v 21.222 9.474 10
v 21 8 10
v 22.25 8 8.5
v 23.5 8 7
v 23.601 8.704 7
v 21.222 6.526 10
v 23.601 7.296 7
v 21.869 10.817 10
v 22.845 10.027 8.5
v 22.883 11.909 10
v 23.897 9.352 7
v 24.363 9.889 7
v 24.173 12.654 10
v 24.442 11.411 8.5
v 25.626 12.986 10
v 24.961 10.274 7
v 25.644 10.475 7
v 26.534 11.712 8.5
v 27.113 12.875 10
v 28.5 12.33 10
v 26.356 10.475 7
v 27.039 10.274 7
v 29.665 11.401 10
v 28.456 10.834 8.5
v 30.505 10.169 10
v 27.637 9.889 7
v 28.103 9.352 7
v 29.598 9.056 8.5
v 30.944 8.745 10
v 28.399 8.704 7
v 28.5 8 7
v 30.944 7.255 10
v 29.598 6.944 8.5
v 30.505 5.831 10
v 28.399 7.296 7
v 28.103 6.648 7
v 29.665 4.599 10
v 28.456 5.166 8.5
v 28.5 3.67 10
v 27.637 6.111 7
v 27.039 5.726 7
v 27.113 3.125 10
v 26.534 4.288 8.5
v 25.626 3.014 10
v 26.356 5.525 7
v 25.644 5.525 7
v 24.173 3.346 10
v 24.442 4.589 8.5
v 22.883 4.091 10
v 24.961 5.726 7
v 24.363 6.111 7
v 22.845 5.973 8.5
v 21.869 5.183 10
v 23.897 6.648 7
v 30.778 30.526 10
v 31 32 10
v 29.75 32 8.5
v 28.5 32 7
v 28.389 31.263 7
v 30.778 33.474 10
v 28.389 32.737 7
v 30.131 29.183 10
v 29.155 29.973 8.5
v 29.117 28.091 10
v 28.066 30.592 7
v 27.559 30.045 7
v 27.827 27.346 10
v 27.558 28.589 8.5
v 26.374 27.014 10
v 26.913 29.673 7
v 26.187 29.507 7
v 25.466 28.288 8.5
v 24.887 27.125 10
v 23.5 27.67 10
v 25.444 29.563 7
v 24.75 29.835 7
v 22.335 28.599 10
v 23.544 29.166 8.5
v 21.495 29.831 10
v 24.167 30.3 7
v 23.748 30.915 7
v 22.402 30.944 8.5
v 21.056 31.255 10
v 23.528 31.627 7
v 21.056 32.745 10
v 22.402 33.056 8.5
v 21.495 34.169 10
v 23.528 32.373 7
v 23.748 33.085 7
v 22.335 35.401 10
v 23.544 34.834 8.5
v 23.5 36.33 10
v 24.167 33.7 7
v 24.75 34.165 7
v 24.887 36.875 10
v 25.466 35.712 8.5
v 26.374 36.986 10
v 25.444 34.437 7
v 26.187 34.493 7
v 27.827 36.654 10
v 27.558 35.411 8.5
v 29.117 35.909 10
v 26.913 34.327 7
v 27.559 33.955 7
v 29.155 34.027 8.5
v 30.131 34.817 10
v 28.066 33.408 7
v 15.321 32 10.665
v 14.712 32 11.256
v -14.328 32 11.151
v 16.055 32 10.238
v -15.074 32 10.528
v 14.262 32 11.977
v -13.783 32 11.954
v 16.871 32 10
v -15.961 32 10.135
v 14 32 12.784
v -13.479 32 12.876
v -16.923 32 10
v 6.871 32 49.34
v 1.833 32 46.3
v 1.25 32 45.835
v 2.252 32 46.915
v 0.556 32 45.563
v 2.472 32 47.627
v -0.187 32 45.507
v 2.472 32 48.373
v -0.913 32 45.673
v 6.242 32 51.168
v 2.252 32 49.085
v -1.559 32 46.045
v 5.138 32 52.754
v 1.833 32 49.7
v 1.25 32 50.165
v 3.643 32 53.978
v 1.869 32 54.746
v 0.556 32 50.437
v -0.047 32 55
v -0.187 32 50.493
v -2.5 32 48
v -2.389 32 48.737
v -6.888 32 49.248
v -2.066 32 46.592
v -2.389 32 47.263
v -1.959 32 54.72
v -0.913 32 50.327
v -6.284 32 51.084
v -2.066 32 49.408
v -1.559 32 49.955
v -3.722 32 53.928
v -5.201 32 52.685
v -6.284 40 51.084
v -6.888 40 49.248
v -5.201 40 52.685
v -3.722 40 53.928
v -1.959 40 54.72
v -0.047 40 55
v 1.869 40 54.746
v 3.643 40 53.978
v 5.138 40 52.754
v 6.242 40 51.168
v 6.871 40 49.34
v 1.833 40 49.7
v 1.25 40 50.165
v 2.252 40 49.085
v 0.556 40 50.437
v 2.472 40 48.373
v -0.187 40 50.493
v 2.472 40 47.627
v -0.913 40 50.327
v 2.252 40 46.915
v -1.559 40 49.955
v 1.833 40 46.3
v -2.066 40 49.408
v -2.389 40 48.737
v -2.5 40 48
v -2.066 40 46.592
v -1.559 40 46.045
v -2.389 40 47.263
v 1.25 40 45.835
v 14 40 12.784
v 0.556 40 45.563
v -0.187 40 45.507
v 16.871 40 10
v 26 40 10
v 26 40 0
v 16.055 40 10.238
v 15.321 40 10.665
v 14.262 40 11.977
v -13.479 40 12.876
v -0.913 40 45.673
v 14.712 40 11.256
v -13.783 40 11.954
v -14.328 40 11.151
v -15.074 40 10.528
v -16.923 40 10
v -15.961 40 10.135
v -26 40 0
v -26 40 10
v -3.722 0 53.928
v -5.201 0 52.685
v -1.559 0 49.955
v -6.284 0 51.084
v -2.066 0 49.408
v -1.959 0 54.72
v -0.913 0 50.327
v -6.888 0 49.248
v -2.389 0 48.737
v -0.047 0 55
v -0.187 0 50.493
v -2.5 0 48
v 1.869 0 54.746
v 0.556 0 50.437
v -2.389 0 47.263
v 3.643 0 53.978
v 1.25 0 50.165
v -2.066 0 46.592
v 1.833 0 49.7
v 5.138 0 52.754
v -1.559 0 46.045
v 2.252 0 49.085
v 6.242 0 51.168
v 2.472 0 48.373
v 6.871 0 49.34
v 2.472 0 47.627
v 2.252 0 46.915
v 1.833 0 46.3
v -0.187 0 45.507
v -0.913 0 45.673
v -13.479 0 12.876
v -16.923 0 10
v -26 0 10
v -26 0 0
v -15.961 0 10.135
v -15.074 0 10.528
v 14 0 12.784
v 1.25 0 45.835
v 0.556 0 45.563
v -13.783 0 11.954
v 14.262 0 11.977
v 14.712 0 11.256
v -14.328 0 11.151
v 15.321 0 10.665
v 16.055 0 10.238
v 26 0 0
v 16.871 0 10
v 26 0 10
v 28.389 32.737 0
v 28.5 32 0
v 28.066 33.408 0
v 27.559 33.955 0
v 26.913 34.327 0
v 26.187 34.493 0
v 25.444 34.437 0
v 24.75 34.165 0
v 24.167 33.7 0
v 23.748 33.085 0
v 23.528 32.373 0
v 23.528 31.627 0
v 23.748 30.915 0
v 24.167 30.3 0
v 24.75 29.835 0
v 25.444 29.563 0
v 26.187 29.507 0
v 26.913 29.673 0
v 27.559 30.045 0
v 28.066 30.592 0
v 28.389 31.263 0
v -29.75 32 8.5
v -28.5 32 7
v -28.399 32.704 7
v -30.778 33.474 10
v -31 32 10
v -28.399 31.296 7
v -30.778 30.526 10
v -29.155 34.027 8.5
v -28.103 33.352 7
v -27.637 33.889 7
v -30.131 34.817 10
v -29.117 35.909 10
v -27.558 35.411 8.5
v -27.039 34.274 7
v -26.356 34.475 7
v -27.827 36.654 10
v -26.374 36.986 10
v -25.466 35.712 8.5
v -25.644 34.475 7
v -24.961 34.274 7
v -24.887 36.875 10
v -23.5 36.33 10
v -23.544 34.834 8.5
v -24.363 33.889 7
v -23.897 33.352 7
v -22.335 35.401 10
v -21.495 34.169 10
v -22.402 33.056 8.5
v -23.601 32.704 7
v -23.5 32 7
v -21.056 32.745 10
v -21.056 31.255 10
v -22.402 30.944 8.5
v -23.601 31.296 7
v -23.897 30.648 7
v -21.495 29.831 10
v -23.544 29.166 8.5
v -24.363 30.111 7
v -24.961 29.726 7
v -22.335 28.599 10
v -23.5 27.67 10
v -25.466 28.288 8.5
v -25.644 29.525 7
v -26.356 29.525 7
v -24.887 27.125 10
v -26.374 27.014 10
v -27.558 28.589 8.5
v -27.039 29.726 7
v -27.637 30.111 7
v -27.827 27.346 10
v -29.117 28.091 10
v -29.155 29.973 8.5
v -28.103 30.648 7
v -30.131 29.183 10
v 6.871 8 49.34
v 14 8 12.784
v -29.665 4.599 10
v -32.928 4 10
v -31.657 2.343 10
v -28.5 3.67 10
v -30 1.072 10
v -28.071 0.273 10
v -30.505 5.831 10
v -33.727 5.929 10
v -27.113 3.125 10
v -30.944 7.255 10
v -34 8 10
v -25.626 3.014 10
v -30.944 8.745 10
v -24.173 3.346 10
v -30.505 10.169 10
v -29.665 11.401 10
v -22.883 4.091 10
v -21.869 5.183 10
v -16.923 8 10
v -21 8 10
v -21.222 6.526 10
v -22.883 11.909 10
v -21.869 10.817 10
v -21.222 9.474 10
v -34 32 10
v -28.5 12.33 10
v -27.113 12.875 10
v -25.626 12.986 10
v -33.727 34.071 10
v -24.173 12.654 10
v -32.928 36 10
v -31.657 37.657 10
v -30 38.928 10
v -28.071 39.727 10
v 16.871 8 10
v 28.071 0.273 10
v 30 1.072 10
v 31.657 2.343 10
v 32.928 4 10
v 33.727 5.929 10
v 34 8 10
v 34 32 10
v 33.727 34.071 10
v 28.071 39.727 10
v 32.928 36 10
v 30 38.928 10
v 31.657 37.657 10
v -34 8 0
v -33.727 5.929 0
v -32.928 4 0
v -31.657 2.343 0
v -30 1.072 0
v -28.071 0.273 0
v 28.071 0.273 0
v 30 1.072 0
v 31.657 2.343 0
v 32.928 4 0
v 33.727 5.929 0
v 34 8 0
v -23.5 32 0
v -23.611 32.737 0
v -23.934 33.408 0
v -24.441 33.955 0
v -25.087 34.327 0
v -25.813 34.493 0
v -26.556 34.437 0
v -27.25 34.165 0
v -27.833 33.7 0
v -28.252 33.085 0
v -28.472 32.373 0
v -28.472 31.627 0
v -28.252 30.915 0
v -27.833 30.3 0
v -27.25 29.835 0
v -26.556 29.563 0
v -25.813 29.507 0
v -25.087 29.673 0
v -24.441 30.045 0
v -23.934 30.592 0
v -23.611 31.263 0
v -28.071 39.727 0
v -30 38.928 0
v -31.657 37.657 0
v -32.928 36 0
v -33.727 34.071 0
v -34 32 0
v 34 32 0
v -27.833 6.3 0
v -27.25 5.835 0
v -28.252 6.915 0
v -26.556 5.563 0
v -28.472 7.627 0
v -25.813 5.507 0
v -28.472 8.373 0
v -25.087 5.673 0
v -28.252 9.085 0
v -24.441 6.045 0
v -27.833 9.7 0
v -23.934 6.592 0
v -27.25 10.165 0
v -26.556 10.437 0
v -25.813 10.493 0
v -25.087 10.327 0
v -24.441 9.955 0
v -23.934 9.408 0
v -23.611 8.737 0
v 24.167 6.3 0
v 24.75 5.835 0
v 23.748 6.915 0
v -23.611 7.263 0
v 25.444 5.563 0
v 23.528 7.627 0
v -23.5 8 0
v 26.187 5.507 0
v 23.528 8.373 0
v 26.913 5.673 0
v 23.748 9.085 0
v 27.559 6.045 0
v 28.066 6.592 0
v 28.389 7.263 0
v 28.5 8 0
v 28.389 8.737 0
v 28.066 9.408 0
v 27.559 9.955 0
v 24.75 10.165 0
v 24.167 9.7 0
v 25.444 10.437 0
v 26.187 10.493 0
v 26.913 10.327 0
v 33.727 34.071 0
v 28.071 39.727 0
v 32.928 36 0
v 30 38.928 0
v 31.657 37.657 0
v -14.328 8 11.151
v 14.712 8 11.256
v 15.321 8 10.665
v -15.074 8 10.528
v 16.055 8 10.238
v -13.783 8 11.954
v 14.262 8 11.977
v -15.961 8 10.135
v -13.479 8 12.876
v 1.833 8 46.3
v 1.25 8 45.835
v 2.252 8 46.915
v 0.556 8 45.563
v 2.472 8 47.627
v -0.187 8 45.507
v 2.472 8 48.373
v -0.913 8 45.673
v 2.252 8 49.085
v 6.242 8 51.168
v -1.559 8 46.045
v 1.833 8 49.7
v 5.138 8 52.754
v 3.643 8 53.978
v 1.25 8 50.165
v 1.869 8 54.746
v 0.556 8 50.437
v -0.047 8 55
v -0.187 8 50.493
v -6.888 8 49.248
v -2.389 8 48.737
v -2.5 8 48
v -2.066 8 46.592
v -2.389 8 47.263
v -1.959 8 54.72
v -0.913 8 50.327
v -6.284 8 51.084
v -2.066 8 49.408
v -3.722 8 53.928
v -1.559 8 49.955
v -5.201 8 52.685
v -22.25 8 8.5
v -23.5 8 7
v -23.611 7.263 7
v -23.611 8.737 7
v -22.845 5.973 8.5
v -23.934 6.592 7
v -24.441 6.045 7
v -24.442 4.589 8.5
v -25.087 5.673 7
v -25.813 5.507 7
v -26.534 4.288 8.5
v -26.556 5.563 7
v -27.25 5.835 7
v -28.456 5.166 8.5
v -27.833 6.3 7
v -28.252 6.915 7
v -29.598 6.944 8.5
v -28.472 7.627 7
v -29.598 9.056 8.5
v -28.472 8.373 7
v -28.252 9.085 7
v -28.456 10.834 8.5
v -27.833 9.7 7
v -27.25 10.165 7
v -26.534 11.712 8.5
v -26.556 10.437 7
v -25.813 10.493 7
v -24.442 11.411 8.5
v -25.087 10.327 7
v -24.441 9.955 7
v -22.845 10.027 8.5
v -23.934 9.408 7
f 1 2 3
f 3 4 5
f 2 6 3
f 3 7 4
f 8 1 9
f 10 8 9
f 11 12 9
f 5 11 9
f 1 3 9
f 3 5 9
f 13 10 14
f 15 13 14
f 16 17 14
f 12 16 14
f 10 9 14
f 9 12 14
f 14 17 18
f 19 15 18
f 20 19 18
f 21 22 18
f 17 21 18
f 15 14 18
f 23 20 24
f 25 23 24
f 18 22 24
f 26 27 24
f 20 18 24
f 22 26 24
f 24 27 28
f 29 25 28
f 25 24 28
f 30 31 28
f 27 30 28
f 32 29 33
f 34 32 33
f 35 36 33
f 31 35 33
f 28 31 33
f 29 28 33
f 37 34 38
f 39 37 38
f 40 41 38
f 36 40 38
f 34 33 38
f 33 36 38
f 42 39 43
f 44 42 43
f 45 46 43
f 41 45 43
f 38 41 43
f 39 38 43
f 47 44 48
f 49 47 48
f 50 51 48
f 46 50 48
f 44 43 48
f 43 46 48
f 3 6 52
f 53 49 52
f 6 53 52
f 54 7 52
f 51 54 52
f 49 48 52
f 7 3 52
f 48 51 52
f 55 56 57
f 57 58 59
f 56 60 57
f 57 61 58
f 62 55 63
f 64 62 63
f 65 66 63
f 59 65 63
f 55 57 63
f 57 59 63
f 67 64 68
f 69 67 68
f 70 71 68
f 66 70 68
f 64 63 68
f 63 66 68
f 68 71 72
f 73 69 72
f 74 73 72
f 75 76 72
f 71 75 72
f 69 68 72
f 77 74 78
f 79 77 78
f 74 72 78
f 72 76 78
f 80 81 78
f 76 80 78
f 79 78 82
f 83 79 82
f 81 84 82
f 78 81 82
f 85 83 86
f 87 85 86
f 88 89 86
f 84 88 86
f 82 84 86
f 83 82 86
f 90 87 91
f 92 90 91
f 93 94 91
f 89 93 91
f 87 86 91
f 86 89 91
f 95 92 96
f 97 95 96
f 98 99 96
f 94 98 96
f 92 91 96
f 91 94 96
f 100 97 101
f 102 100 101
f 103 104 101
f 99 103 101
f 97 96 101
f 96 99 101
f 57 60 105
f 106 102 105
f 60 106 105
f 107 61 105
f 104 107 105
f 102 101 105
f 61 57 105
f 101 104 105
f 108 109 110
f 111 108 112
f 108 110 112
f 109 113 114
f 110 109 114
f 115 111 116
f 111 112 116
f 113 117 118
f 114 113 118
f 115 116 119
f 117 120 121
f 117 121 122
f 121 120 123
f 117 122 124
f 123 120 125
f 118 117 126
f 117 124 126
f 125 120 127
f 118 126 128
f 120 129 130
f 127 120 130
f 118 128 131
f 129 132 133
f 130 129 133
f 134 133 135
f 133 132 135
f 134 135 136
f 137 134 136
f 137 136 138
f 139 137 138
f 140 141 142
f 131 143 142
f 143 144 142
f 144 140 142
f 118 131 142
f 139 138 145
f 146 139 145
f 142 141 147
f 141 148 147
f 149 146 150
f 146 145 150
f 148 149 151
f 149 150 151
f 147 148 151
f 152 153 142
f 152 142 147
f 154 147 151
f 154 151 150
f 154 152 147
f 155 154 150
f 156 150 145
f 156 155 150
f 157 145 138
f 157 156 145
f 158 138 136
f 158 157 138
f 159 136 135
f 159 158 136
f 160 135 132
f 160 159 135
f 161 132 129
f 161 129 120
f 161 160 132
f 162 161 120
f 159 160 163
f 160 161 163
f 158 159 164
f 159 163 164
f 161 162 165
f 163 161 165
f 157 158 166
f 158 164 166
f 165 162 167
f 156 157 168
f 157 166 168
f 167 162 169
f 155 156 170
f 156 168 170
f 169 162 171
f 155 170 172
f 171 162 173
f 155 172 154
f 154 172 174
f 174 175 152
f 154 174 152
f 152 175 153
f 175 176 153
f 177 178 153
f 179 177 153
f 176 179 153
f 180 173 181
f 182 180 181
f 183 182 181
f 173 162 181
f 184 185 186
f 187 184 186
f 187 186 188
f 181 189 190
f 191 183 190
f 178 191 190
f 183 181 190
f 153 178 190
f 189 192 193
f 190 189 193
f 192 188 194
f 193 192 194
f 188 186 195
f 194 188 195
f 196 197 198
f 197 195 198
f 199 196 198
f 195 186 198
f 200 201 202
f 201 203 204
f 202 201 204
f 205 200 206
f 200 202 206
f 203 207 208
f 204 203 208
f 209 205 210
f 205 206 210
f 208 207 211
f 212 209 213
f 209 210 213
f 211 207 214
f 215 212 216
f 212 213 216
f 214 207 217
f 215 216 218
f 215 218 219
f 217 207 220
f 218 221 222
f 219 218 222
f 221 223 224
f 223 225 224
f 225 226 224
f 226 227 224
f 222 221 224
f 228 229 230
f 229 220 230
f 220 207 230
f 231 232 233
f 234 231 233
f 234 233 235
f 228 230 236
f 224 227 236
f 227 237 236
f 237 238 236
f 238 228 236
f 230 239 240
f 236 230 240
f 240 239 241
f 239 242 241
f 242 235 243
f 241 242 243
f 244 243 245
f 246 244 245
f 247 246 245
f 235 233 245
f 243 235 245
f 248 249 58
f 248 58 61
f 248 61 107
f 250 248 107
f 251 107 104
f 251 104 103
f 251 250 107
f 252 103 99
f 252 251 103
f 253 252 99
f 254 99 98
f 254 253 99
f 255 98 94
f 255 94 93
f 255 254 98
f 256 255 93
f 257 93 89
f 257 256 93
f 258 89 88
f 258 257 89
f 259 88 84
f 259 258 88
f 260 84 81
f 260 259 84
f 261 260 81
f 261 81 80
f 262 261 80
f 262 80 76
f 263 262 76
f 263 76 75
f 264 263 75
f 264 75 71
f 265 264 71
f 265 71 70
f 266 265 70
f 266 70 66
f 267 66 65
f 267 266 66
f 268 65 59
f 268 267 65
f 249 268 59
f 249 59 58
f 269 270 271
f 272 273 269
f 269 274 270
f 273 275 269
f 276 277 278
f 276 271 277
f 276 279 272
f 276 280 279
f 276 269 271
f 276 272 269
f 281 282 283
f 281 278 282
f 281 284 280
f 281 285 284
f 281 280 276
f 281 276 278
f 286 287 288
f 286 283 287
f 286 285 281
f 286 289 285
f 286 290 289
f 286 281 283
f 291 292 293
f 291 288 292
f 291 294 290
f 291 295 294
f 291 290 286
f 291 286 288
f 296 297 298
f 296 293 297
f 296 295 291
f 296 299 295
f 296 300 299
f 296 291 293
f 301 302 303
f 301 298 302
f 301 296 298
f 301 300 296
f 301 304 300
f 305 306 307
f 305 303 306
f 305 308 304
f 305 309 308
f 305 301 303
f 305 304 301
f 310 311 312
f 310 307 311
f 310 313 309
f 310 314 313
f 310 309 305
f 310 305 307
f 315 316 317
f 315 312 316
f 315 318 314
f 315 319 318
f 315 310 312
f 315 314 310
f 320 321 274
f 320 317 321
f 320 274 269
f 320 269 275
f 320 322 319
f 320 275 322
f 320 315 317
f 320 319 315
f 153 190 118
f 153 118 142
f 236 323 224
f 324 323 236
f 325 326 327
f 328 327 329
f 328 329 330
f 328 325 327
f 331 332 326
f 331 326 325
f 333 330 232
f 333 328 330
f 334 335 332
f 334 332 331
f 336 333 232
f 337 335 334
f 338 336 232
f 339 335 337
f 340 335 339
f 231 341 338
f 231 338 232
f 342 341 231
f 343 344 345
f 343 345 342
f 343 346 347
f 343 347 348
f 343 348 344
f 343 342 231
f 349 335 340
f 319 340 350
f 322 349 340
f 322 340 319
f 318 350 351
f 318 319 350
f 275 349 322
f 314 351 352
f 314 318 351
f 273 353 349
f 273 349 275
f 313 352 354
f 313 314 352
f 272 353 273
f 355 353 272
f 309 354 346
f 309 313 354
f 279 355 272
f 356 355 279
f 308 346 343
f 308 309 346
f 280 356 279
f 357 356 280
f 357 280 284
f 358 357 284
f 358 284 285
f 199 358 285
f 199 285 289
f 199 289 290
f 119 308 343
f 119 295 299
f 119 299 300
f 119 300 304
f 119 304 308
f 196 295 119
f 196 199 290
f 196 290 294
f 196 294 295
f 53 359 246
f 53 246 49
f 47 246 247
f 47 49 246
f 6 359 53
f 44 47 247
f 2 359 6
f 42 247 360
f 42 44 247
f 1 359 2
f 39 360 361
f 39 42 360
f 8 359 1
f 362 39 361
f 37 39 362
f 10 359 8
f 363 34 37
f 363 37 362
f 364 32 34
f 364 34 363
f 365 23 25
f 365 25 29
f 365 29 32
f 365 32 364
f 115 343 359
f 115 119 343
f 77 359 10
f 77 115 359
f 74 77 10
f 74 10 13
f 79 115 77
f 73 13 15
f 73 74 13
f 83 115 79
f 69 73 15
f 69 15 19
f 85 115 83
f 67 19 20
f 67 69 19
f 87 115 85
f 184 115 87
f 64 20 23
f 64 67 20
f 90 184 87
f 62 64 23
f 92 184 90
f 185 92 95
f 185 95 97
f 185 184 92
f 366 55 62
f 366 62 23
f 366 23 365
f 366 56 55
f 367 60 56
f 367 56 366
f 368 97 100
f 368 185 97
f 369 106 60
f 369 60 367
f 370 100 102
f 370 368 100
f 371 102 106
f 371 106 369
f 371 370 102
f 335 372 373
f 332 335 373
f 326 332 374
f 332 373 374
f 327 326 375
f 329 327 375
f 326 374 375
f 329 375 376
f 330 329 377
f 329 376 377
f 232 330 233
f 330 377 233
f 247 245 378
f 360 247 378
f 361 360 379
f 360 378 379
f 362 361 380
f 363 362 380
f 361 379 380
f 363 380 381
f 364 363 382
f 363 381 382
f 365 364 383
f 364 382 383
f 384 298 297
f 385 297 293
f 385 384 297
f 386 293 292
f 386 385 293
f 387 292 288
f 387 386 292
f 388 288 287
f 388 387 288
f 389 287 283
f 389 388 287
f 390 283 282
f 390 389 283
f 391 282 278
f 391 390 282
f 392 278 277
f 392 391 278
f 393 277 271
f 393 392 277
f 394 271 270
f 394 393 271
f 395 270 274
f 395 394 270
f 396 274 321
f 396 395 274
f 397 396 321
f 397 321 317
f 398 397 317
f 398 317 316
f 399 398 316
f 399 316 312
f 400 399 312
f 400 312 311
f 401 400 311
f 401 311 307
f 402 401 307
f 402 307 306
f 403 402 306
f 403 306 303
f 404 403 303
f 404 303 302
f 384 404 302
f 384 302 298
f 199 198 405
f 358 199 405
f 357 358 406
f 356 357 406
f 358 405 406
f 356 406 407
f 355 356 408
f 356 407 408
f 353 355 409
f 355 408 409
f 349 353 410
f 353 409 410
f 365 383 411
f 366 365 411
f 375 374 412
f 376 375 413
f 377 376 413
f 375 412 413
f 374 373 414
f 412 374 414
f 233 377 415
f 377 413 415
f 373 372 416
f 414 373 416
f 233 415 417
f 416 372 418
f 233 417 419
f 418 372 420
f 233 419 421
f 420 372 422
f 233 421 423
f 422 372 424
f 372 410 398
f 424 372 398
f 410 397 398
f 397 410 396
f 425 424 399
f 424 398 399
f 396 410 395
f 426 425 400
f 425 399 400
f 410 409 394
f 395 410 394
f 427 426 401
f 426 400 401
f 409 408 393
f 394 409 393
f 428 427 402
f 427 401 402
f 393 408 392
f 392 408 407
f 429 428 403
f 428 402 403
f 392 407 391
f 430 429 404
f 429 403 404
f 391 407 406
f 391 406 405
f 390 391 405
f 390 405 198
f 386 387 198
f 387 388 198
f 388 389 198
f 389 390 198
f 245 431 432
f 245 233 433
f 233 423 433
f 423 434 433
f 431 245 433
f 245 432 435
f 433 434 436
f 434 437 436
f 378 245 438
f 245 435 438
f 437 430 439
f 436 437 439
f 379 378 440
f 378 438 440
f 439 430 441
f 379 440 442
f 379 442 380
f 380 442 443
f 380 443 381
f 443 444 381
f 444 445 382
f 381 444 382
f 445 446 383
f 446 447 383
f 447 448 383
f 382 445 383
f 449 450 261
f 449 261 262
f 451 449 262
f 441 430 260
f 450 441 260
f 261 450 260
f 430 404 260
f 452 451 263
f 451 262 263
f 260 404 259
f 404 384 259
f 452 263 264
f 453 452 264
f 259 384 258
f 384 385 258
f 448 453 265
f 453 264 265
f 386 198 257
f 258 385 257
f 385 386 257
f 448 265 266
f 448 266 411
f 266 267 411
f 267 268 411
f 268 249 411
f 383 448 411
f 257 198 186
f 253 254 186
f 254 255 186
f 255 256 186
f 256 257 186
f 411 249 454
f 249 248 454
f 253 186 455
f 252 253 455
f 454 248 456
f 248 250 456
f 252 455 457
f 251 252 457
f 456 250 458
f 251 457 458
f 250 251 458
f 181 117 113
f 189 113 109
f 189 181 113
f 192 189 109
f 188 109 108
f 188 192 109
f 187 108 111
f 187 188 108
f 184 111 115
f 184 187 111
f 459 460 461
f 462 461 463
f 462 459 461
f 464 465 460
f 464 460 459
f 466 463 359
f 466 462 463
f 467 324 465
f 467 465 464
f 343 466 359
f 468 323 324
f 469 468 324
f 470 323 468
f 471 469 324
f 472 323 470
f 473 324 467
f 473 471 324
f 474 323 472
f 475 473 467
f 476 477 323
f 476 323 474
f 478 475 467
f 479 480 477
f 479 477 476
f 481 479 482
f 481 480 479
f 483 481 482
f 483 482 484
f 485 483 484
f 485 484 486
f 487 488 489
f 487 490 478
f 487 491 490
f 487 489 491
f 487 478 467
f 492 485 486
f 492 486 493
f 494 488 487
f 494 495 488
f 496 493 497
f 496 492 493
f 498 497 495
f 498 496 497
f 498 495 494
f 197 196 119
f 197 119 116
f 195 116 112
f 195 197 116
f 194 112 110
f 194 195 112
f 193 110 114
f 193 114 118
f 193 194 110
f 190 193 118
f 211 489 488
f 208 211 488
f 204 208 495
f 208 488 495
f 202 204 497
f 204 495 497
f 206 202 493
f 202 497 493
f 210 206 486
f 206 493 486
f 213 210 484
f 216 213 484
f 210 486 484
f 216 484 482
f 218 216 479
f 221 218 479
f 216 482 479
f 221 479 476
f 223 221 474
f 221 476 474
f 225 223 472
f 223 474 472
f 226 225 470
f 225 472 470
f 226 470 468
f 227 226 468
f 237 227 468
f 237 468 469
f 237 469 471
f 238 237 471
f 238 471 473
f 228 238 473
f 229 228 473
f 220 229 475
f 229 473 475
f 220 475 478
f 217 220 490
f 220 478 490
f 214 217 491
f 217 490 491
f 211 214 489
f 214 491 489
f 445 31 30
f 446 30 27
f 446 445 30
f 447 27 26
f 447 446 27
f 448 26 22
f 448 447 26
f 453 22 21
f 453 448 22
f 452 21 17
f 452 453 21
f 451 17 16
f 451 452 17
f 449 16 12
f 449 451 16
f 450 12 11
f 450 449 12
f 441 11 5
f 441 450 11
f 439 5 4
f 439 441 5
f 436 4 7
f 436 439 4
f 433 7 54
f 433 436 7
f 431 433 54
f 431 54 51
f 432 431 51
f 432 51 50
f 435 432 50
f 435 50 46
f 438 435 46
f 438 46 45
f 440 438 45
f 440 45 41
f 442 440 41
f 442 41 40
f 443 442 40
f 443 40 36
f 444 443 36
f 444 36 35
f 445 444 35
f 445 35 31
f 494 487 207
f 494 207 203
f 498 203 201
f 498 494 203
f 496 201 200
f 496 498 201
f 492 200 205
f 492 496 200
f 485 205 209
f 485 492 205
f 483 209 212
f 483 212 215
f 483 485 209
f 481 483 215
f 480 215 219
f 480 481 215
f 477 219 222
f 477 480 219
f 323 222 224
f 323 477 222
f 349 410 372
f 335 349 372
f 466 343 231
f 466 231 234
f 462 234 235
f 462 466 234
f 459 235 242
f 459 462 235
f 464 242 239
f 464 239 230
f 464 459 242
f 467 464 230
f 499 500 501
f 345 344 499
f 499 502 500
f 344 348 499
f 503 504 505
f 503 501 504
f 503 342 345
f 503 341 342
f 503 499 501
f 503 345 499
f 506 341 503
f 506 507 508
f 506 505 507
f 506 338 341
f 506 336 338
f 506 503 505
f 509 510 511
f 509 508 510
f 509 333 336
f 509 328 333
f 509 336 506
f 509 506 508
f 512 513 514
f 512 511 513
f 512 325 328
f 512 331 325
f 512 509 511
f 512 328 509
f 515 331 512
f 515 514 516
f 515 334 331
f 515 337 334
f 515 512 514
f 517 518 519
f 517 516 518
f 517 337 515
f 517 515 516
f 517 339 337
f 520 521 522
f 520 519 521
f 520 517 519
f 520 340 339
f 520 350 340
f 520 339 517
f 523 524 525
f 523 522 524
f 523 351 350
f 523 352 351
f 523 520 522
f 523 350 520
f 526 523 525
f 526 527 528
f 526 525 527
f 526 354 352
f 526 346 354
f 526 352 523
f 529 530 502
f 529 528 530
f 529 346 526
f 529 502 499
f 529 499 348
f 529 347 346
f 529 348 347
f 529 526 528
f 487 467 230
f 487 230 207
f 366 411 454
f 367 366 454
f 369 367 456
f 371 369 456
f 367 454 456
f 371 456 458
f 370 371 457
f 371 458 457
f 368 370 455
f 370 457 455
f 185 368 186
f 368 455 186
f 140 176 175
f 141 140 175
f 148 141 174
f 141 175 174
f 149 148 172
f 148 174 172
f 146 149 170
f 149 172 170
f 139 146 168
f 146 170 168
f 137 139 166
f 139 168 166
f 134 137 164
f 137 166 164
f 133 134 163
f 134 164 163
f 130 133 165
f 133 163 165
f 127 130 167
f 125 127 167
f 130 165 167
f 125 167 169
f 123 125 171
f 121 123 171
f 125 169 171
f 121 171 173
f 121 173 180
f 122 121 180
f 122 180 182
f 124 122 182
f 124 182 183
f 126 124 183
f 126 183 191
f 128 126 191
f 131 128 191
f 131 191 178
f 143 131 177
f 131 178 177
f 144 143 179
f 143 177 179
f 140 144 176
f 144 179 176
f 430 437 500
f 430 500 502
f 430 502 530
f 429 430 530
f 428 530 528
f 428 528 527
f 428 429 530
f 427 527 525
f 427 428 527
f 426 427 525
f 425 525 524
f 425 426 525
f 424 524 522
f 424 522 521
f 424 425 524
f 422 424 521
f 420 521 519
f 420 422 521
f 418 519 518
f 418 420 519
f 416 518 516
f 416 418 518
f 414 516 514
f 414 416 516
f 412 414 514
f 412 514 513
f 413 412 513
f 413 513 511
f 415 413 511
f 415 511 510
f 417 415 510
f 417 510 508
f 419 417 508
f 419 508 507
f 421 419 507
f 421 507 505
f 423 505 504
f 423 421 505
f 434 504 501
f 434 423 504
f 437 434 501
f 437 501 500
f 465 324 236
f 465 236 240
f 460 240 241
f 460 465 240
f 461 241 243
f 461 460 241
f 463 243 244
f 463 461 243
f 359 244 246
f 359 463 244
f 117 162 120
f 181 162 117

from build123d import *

# Parameters (mm, degrees)
F0_R     = 5
F0_R_2   = 2.5
F1_DEPTH = 10
F2_R     = 2.5
F3_DEPTH = 8
F4_START = -32
F4_DEPTH = 8
F5_DEPTH = 7


with BuildPart() as f1:
    # F0 (on Top) → F1 (new body)
    with BuildSketch(Plane.XY):
        with BuildLine():
            Line((26, 40), (-26, 40))
            ThreePointArc((-26, 40), (-31.6568542495, 37.6568542495), (-34, 32))
            Line((-34, 32), (-34, 8))
            ThreePointArc((-34, 8), (-31.6568542495, 2.3431457505), (-26, 0))
            Line((-26, 0), (26, 0))
            ThreePointArc((26, 0), (31.6568542495, 2.3431457505), (34, 8))
            Line((34, 8), (34, 32))
            ThreePointArc((34, 32), (31.6568542495, 37.6568542495), (26, 40))
        make_face()
        with Locations((-26, 8)):
            Circle(F0_R, mode=Mode.SUBTRACT)
        with Locations((26, 8)):
            Circle(F0_R, mode=Mode.SUBTRACT)
        with Locations((-26, 32)):
            Circle(F0_R, mode=Mode.SUBTRACT)
        with Locations((26, 32)):
            Circle(F0_R, mode=Mode.SUBTRACT)
        with Locations((-26, 32)):
            Circle(F0_R)
        with Locations((-26, 32)):
            Circle(F0_R_2, mode=Mode.SUBTRACT)
        with Locations((-26, 8)):
            Circle(F0_R)
        with Locations((-26, 8)):
            Circle(F0_R_2, mode=Mode.SUBTRACT)
        with Locations((26, 8)):
            Circle(F0_R)
        with Locations((26, 8)):
            Circle(F0_R_2, mode=Mode.SUBTRACT)
        with Locations((26, 32)):
            Circle(F0_R)
        with Locations((26, 32)):
            Circle(F0_R_2, mode=Mode.SUBTRACT)
        with Locations((26, 32)):
            Circle(F0_R_2)
        with Locations((26, 8)):
            Circle(F0_R_2)
        with Locations((-26, 8)):
            Circle(F0_R_2)
        with Locations((-26, 32)):
            Circle(F0_R_2)
    extrude(amount=F1_DEPTH)

    # F2 (on face) → F3 (join)
    with BuildSketch(Plane(origin=(0, 40, 0), x_dir=(-1, 0, 0), z_dir=(0, 1, 0))):
        with BuildLine():
            ThreePointArc((-14, 12.7841615349), (-14.9984986023, 10.9417491732), (-16.8705539605, 10))
            Line((-16.8705539605, 10), (16.922764346, 10))
            ThreePointArc((16.922764346, 10), (14.6793579532, 10.8135287538), (13.4788519072, 12.8759269962))
            Line((13.4788519072, 12.8759269962), (6.8878248776, 49.2481460075))
            ThreePointArc((6.8878248776, 49.2481460075), (6.9718998179, 48.6265883246), (7, 48))
            ThreePointArc((7, 48), (-0.673098164, 41.0324366625), (-6.8705539605, 49.3399583115))
            Line((-6.8705539605, 49.3399583115), (-14, 12.7841615349))
        make_face()
        with BuildLine():
            ThreePointArc((6.8878248776, 49.2481460075), (0.0467113041, 54.999844145), (-6.8705539605, 49.3399583115))
            ThreePointArc((-6.8705539605, 49.3399583115), (-0.673098164, 41.0324366625), (7, 48))
            ThreePointArc((7, 48), (6.9718998179, 48.6265883246), (6.8878248776, 49.2481460075))
        make_face()
        with Locations((0, 48)):
            Circle(F2_R, mode=Mode.SUBTRACT)
    extrude(amount=-F3_DEPTH)

    # F2 (on face) → F4 (join)
    with BuildSketch(Plane(origin=(0, 40, 0), x_dir=(-1, 0, 0), z_dir=(0, 1, 0)).offset(F4_START)):
        with BuildLine():
            ThreePointArc((-14, 12.7841615349), (-14.9984986023, 10.9417491732), (-16.8705539605, 10))
            Line((-16.8705539605, 10), (16.922764346, 10))
            ThreePointArc((16.922764346, 10), (14.6793579532, 10.8135287538), (13.4788519072, 12.8759269962))
            Line((13.4788519072, 12.8759269962), (6.8878248776, 49.2481460075))
            ThreePointArc((6.8878248776, 49.2481460075), (6.9718998179, 48.6265883246), (7, 48))
            ThreePointArc((7, 48), (-0.673098164, 41.0324366625), (-6.8705539605, 49.3399583115))
            Line((-6.8705539605, 49.3399583115), (-14, 12.7841615349))
        make_face()
        with BuildLine():
            ThreePointArc((6.8878248776, 49.2481460075), (0.0467113041, 54.999844145), (-6.8705539605, 49.3399583115))
            ThreePointArc((-6.8705539605, 49.3399583115), (-0.673098164, 41.0324366625), (7, 48))
            ThreePointArc((7, 48), (6.9718998179, 48.6265883246), (6.8878248776, 49.2481460075))
        make_face()
        with Locations((0, 48)):
            Circle(F2_R, mode=Mode.SUBTRACT)
    extrude(amount=-F4_DEPTH)

    # F0 (on Top) → F5 (cut)
    with BuildSketch(Plane.XY):
        with Locations((26, 8)):
            Circle(F0_R_2)
        with Locations((26, 32)):
            Circle(F0_R_2)
        with Locations((-26, 32)):
            Circle(F0_R_2)
        with Locations((-26, 8)):
            Circle(F0_R_2)
    extrude(amount=F5_DEPTH, mode=Mode.SUBTRACT)

    # F7 (on offset) → F8 (revolve, cut)
    with BuildSketch(Plane.XZ.offset(-8)):
        Polygon((-21, 10), (-26, 10), (-26, 7), (-23.5, 7), align=None)
    revolve(axis=Axis((-26, 8, 8.5), (0, 0, -1)), mode=Mode.SUBTRACT)

    # F9 (on offset) → F10 (revolve, cut)
    with BuildSketch(Plane.XZ.offset(-8)):
        Polygon((26, 7), (26, 10), (21, 10), (23.5, 7), align=None)
    revolve(axis=Axis((26, 8, 8.5), (0, 0, -1)), mode=Mode.SUBTRACT)

    # F12 (on offset) → F13 (revolve, cut)
    with BuildSketch(Plane(origin=(0, 32, 0), x_dir=(-1, 0, 0), z_dir=(0, 1, 0))):
        Polygon((-26, 7), (-26, 10), (-31, 10), (-28.5, 7), align=None)
    revolve(axis=Axis((26, 32, 8.5), (0, 0, -1)), mode=Mode.SUBTRACT)

    # F14 (on offset) → F15 (revolve, cut)
    with BuildSketch(Plane(origin=(0, 32, 0), x_dir=(-1, 0, 0), z_dir=(0, 1, 0))):
        Polygon((31, 10), (26, 10), (26, 7), (28.5, 7), align=None)
    revolve(axis=Axis((-26, 32, 8.5), (0, 0, -1)), mode=Mode.SUBTRACT)


solid = f1.part
